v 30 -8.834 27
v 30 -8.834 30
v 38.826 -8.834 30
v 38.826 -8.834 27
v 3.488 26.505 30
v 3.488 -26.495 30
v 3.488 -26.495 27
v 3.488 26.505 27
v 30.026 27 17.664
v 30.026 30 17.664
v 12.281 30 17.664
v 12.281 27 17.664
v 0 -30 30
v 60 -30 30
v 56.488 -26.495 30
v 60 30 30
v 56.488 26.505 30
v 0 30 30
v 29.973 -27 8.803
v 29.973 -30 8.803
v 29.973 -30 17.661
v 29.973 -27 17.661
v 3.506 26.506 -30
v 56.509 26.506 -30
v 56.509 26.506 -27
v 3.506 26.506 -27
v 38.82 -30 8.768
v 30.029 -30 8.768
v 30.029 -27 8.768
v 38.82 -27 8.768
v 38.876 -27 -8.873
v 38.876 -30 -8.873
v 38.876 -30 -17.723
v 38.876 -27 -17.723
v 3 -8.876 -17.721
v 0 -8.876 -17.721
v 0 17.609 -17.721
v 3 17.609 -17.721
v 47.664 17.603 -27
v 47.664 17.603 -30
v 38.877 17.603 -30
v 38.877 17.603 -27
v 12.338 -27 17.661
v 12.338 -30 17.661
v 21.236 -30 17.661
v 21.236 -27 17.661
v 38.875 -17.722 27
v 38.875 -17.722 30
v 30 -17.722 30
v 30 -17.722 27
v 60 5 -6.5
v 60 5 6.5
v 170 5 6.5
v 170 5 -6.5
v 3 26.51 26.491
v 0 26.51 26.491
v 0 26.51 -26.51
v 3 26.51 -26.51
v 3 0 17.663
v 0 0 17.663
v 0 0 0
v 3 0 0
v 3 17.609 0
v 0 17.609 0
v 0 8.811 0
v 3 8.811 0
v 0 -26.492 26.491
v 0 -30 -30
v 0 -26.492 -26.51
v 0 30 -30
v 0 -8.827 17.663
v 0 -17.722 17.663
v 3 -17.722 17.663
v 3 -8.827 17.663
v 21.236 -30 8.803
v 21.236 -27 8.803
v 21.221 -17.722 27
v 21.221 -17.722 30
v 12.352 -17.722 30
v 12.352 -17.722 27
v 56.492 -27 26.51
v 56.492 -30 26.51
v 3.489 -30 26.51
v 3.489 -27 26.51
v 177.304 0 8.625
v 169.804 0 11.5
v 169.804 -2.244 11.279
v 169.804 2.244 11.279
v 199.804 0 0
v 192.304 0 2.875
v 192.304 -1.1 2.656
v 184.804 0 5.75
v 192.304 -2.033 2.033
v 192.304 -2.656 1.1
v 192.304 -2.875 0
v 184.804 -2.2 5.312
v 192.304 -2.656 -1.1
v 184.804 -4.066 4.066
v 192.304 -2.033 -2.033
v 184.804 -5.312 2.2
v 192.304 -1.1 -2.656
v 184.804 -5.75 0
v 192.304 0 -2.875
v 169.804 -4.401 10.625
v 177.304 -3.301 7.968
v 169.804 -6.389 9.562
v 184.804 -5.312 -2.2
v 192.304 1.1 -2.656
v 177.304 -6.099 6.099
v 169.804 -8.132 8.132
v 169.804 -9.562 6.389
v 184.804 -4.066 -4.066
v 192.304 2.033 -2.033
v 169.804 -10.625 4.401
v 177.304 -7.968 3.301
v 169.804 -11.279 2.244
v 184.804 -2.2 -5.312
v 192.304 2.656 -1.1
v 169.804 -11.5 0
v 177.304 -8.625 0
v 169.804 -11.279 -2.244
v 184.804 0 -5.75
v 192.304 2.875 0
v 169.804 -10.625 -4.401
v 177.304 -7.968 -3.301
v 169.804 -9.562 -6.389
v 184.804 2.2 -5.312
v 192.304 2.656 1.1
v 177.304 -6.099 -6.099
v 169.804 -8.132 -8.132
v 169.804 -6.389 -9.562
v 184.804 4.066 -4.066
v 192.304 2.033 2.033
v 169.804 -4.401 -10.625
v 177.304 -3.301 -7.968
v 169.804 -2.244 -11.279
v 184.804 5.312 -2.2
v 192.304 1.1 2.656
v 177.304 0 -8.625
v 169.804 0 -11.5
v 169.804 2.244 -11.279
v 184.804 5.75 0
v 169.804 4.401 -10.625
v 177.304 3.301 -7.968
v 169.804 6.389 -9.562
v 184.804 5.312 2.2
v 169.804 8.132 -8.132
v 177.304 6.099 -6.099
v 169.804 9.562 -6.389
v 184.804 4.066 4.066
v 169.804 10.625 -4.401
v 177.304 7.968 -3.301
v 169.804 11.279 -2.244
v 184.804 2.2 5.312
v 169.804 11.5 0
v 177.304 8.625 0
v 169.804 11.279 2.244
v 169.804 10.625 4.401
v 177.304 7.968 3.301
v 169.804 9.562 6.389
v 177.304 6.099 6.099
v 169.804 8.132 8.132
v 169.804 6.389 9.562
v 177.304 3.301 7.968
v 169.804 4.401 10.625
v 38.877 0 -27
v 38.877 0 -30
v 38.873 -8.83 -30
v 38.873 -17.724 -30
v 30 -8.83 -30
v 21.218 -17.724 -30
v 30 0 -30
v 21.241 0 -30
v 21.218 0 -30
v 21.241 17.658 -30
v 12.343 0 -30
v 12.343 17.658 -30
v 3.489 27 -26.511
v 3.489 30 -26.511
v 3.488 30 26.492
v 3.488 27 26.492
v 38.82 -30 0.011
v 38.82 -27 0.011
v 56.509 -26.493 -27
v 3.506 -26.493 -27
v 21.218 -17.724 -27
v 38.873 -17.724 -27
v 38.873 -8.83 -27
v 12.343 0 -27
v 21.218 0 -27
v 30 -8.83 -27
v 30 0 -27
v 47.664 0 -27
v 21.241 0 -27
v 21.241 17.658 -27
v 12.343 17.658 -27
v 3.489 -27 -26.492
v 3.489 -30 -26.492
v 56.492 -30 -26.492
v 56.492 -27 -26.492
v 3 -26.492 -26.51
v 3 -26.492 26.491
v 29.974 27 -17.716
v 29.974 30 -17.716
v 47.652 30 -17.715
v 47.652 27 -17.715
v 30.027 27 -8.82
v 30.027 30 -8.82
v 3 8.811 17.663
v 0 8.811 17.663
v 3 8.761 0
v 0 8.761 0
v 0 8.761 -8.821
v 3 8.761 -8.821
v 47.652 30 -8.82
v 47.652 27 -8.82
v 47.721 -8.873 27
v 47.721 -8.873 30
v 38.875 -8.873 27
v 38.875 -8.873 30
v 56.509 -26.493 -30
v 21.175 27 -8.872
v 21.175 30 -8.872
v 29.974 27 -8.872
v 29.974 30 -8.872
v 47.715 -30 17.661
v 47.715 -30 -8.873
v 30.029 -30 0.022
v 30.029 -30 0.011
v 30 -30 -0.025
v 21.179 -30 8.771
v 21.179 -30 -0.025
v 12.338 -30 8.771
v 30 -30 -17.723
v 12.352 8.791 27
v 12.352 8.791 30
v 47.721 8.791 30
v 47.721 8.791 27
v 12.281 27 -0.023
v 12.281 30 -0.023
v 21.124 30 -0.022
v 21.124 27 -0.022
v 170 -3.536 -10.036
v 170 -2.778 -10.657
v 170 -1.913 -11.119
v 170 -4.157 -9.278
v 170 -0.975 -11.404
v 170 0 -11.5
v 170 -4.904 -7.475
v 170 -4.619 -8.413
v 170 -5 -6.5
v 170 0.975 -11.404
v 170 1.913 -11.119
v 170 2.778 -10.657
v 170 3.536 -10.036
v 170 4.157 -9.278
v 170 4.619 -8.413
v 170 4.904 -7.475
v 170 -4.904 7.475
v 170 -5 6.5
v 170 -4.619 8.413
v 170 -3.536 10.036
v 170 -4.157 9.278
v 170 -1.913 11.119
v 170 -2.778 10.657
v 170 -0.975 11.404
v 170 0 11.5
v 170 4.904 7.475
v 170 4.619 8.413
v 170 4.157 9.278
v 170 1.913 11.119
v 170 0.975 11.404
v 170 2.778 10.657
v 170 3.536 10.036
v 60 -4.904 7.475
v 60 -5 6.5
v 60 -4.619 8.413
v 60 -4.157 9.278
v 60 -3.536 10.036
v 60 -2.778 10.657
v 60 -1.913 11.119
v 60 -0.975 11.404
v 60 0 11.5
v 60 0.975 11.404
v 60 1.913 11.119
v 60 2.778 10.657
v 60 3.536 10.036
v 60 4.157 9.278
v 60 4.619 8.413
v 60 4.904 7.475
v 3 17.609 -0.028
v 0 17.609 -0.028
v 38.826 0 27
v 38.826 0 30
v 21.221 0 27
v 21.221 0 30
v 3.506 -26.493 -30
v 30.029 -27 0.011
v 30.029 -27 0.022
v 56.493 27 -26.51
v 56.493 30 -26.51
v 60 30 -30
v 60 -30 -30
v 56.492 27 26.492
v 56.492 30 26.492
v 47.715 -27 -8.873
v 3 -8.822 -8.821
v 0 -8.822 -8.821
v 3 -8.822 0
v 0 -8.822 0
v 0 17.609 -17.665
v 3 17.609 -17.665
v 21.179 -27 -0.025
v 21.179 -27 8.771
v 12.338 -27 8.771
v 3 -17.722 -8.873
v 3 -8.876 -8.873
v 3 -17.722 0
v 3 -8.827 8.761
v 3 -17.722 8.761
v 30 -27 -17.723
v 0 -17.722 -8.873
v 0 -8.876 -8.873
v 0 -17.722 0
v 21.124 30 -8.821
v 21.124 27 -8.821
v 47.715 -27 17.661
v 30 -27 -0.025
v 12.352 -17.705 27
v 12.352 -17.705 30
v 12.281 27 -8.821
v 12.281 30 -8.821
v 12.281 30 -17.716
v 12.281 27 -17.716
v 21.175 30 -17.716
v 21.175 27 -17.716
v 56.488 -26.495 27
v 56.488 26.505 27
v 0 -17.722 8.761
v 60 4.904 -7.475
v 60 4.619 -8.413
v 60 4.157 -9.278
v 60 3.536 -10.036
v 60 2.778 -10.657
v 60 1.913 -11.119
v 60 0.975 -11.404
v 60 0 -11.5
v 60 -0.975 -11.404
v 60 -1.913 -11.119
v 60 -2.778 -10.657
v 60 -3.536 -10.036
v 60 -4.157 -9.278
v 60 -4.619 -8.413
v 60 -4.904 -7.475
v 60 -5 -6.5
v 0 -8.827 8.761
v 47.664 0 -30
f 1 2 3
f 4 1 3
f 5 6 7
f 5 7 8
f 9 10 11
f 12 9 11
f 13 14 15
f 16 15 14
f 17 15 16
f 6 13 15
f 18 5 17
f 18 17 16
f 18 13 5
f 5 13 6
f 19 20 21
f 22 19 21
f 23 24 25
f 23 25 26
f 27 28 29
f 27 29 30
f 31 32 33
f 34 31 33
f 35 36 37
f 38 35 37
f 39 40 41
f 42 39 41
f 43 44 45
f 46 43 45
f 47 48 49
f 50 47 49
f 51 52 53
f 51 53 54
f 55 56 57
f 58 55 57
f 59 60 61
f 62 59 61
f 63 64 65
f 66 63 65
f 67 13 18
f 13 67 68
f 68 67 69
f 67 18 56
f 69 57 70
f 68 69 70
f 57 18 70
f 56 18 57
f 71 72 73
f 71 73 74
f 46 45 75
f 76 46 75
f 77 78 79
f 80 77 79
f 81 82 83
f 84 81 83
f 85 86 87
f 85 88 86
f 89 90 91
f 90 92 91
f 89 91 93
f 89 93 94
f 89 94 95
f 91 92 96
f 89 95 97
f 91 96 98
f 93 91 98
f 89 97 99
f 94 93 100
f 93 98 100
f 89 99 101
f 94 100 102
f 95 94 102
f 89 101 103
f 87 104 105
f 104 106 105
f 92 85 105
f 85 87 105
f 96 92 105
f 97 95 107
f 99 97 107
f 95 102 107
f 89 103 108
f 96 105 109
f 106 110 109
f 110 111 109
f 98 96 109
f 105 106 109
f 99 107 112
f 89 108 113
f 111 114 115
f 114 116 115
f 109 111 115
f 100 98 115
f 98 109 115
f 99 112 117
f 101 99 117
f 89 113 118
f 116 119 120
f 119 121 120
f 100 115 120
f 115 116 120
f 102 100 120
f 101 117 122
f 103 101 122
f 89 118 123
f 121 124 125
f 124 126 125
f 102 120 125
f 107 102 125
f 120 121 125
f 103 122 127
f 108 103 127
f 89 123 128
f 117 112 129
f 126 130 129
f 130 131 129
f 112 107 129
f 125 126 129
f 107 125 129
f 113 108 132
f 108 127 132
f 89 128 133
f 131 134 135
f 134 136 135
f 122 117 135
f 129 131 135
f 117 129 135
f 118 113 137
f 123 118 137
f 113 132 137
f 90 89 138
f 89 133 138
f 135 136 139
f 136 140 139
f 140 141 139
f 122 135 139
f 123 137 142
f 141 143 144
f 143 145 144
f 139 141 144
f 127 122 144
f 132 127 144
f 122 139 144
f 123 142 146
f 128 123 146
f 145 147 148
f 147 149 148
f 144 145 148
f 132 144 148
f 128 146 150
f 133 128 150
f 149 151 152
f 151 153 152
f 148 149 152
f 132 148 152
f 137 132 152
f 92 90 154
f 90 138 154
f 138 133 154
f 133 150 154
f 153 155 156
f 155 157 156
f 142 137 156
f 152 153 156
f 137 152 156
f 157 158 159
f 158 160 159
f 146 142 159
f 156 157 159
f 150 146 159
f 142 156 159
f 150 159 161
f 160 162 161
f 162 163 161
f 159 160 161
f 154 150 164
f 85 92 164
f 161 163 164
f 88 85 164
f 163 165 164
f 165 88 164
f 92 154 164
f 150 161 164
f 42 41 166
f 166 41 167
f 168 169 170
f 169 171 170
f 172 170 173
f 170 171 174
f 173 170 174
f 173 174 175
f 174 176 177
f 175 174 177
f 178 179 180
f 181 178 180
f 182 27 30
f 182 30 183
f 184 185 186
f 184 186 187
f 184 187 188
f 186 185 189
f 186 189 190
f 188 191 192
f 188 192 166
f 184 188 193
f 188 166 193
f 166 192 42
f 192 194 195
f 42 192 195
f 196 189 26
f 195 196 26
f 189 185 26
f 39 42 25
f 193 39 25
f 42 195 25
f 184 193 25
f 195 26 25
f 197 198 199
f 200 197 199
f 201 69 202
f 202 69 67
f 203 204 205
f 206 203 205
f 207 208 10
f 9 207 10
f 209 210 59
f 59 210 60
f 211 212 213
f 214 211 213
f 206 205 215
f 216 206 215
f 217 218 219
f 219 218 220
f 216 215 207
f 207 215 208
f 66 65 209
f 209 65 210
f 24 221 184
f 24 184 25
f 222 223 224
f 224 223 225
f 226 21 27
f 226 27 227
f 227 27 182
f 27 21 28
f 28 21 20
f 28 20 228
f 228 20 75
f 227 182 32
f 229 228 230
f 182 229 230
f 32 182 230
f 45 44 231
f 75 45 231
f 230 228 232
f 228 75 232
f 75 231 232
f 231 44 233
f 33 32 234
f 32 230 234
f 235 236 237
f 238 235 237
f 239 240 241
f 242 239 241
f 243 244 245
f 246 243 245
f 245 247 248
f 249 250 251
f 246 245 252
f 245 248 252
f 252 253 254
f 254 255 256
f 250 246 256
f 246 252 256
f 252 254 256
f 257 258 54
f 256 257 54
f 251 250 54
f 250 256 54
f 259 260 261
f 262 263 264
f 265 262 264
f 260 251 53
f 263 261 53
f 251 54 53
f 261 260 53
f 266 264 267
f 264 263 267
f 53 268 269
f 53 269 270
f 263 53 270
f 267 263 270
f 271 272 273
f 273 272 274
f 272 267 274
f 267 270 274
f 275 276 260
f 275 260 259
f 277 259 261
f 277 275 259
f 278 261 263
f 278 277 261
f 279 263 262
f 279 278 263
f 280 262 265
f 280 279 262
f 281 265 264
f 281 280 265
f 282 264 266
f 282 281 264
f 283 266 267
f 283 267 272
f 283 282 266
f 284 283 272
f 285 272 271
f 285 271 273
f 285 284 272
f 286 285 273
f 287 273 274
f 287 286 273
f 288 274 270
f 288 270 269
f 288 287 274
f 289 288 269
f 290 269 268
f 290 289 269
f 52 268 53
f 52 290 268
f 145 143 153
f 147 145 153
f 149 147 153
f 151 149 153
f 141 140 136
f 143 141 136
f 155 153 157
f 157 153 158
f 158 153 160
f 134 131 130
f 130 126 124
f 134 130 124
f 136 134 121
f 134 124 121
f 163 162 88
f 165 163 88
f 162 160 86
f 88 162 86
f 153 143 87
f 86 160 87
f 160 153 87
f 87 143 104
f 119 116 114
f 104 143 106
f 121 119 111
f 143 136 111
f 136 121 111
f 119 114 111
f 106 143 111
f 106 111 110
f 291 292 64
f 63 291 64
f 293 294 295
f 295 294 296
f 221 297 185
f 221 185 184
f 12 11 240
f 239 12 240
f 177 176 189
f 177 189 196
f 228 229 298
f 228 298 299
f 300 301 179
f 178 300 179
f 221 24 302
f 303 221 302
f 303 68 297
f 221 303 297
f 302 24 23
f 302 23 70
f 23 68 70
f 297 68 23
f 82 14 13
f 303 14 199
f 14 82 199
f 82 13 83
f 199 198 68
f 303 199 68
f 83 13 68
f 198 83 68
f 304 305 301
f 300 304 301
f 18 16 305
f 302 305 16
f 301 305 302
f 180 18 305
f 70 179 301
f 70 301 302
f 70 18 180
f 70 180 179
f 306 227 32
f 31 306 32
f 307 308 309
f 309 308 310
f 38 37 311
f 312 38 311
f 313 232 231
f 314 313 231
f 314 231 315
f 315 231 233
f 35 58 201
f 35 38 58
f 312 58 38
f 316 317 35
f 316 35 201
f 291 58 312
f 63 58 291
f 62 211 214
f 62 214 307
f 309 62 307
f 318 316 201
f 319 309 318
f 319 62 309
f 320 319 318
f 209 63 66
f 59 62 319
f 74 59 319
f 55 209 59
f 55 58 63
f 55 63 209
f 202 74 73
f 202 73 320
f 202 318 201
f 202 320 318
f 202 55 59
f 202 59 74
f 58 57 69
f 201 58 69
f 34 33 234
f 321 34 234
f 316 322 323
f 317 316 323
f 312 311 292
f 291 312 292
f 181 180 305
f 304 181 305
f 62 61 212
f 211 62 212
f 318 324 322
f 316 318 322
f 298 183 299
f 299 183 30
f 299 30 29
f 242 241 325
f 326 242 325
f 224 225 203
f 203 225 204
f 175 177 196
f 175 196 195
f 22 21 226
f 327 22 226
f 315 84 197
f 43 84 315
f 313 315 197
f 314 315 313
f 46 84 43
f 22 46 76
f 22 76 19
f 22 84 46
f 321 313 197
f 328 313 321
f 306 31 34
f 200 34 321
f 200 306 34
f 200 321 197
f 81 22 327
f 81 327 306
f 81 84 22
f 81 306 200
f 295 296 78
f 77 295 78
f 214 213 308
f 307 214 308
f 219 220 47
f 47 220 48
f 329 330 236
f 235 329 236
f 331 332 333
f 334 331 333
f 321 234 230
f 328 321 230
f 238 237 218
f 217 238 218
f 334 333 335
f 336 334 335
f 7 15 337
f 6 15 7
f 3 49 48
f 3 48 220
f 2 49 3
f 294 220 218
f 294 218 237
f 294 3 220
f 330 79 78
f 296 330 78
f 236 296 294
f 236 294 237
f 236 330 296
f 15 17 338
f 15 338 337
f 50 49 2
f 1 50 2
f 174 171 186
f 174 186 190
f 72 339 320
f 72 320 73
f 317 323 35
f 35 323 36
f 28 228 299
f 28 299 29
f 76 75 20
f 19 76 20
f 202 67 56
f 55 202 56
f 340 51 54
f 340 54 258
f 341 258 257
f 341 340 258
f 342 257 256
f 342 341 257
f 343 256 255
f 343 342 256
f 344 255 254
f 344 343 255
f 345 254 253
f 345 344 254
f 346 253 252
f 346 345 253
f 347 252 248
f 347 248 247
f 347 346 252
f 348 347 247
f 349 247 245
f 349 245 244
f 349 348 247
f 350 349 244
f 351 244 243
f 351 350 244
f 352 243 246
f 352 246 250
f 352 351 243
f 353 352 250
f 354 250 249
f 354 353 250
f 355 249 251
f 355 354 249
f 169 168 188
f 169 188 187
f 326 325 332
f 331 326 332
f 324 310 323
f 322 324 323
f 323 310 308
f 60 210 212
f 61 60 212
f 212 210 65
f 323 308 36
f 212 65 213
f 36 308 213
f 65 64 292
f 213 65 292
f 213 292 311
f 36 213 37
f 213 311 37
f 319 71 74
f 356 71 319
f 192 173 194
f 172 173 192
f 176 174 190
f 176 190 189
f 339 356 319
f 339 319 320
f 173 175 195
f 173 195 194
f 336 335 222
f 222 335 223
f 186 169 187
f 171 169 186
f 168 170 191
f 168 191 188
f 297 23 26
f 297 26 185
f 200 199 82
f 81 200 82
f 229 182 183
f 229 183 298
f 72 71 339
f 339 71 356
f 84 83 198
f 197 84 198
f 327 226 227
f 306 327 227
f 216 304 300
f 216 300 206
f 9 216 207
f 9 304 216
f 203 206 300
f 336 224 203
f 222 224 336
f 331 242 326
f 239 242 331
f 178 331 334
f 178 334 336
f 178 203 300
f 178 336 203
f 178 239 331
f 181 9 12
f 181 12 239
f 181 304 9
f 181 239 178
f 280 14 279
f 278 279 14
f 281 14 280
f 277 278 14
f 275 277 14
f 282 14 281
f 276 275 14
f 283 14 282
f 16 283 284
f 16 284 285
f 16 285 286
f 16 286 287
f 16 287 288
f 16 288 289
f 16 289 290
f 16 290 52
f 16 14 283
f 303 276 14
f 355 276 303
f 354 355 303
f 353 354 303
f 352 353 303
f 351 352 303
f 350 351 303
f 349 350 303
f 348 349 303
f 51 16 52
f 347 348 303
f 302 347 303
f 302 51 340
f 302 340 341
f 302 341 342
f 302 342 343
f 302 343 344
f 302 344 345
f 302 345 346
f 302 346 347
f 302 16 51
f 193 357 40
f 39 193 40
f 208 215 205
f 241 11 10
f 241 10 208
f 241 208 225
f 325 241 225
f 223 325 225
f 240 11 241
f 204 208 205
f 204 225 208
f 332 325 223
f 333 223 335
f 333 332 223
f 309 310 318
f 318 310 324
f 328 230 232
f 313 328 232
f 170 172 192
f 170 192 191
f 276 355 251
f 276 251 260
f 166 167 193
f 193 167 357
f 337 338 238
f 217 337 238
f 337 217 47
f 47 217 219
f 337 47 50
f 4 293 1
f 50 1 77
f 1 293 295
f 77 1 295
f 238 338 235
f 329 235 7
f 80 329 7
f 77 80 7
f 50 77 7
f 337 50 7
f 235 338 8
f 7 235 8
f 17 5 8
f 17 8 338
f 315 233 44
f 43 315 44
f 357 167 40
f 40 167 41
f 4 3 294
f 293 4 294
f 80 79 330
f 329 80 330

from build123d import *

# Parameters (mm, degrees)
ESTRUSIONE_ESTRUSIONE1_DEPTH = 170
SCHIZZO5_W                   = 60
SCHIZZO5_H                   = 60
ESTRUSIONE_ESTRUSIONE2_DEPTH = 60
TAGLIO_ESTRUSIONE10_DEPTH    = 3
TAGLIO_ESTRUSIONE11_DEPTH    = 3
TAGLIO_ESTRUSIONE13_DEPTH    = 3
TAGLIO_ESTRUSIONE14_DEPTH    = 3
TAGLIO_ESTRUSIONE15_DEPTH    = 3


with BuildPart() as part:
    # Schizzo3 → Estrusione-Estrusione1 (new body)
    with BuildSketch(Plane(origin=(0, 0, 0), x_dir=(0, 0, -1), z_dir=(1, 0, 0))):
        with BuildLine():
            Line((-6.5, 5), (6.5, 5))
            ThreePointArc((6.5, 5), (11.5, 0), (6.5, -5))
            Line((6.5, -5), (-6.5, -5))
            ThreePointArc((-6.5, -5), (-11.5, 0), (-6.5, 5))
        make_face()
    extrude(amount=ESTRUSIONE_ESTRUSIONE1_DEPTH)

    # Schizzo5 → Estrusione-Estrusione2 (add)
    with BuildSketch(Plane(origin=(0, 0, 0), x_dir=(0, 0, -1), z_dir=(1, 0, 0))):
        Rectangle(SCHIZZO5_W, SCHIZZO5_H)
    extrude(amount=ESTRUSIONE_ESTRUSIONE2_DEPTH)

    # Schizzo3D7 → Taglio-Estrusione10 (cut)
    with BuildSketch(Plane(origin=(56.509252896, 26.505952129, -30), x_dir=(-0.7071372191638572, -0.7070763418989545, 0), z_dir=(0, 0, -1))):
        Polygon((0, 0), (37.480879661, 37.477652941), (74.95530616, 0), (37.4744265, -37.477652941), align=None)
        Polygon((12.549447187, -0.041107367), (18.763393239, 6.172303729), (31.2103731, -6.275747782), (24.996427048, -12.489158877), align=None, mode=Mode.SUBTRACT)
        Polygon((43.745393177, -18.806291324), (56.229474498, -6.323284754), (43.697232303, 6.210036431), (49.973132388, 12.485396224), (37.487721799, 24.971881772), (31.196030757, 18.680732379), (43.681441346, 6.194246832), (37.487382187, 0.000720919), (43.730669214, -6.243103637), (37.456438009, -12.516794695), align=None, mode=Mode.SUBTRACT)
    extrude(amount=-TAGLIO_ESTRUSIONE10_DEPTH, mode=Mode.SUBTRACT)

    # Schizzo3D9 → Taglio-Estrusione11 (cut)
    with BuildSketch(Plane(origin=(3.48896397, 30, -26.510632889), x_dir=(0.7071079856740462, 0, 0.7071055766969973), z_dir=(0, -1, 0))):
        Polygon((0, 0), (37.477803778, 37.478791667), (74.95758336, 0), (37.479779582, -37.478791667), align=None)
        Polygon((12.43579878, 0.00203054), (18.724902507, -6.286907414), (24.978062752, -0.033582341), (31.199748191, -6.255103785), (24.946587946, -12.508428859), (37.447554582, -25.009065987), (43.737305453, -18.719149323), (31.273888011, -6.256060399), (50.001148896, 12.471694123), (37.452810535, 25.019701726), (24.946652169, 12.513213707), (31.199675089, 6.260355607), (24.978572571, 0.039089105), (18.72554965, 6.291947204), align=None, mode=Mode.SUBTRACT)
    extrude(amount=TAGLIO_ESTRUSIONE11_DEPTH, mode=Mode.SUBTRACT)

    # Schizzo3D10 → Taglio-Estrusione13 (cut)
    # profile 1 of 2: a face of its own
    with BuildSketch(Plane(origin=(3.488655303, -30, 26.510146491), x_dir=(0.7071145512231992, 0, -0.7070990110645141), z_dir=(0, -1, 0))):
        Polygon((0, 0), (37.477604433, -37.478428091), (74.9568562, 0), (37.479251767, 37.478428091), align=None)
        Polygon((25.052273044, -0.034278035), (18.80084393, -6.285569762), (12.515044966, 0.000367348), (18.806420078, 6.291604196), (25.070142969, 0.027743646), (31.248306687, 6.205771587), (24.984583796, 12.469632138), (37.530042105, 25.014814736), (56.292018249, 6.252426254), (50.041865549, 0.002410912), (56.299922917, -6.255783991), (50.023820889, -12.531748091), (37.509650627, -0.0173028), (31.272337329, -6.254479021), align=None, mode=Mode.SUBTRACT)
    # profile 2 of 2: a face of its own
    with BuildSketch(Plane(origin=(3.488655303, -30, 26.510146491), x_dir=(0.7071145512231992, 0, -0.7070990110645141), z_dir=(0, -1, 0))):
        Polygon((37.496799303, 0.036168583), (31.312223937, 6.22087987), (37.528934609, 12.437453919), (43.720930387, 6.245322057), (37.504355954, 0.028884245), align=None)
    extrude(amount=-TAGLIO_ESTRUSIONE13_DEPTH, mode=Mode.SUBTRACT)

    # Schizzo3D11 → Taglio-Estrusione14 (cut)
    with BuildSketch(Plane(origin=(3.48761134, -26.495070277, 30), x_dir=(0.7071106609809186, 0.7071029013708885, 0), z_dir=(0, 0, 1))):
        Polygon((0, 0), (37.47640364, 37.476814899), (74.953629802, 0), (37.477226162, -37.476814899), align=None)
        Polygon((12.483616576, -0.053090758), (31.219303961, 18.682802228), (56.228931149, -6.326550512), (43.738644318, -18.816974409), (37.483135519, -12.561534256), (31.226265699, -18.818472739), (24.950948382, -12.543224286), (31.235576896, -6.258526806), (37.476342879, -12.499224305), (43.722678491, -6.252820147), (31.274462582, 6.195259158), (18.743498457, -6.335842479), (12.472147309, -0.064560151), align=None, mode=Mode.SUBTRACT)
    extrude(amount=-TAGLIO_ESTRUSIONE14_DEPTH, mode=Mode.SUBTRACT)

    # Schizzo3D12 → Taglio-Estrusione15 (cut)
    with BuildSketch(Plane(origin=(0, 26.510328561, -26.510258091), x_dir=(0, -0.7071155777670133, 0.707097984496649), z_dir=(-1, 0, 0))):
        Polygon((0, 0), (37.478907887, -37.477975399), (74.955950822, 0), (37.477042935, 37.477975399), align=None)
        Polygon((12.548610555, -0.039984823), (25.020040578, 12.431755501), (25.039803863, 12.451519277), (31.26096878, 6.230509145), (43.750153238, 18.720004346), (49.98040082, 12.489911774), (37.491216362, 0.000416573), (31.296299436, 6.195179367), (25.059044147, -0.04223111), (37.492371823, -12.475249441), (43.729627112, -6.237838964), (50.02267626, -12.530731538), (43.748911666, -18.804652229), (37.493935145, -12.549831334), (31.237084407, -18.806837749), (12.509188531, -0.079407829), align=None, mode=Mode.SUBTRACT)
        Polygon((49.927796206, -0.045447197), (56.217879582, -6.335374073), (62.511860718, -0.041236337), (56.221777342, 6.248690539), align=None, mode=Mode.SUBTRACT)
    extrude(amount=-TAGLIO_ESTRUSIONE15_DEPTH, mode=Mode.SUBTRACT)


with BuildPart() as body_2:
    # Schizzo8 → Rivoluzione1 (revolve)
    with BuildSketch(Plane(origin=(-2.00656725, 0, 0), x_dir=(1, 0, 0), z_dir=(0, 1, 0))):
        Polygon((171.810987293, 0), (201.810987293, 0), (171.810987293, -11.5), align=None)
    revolve(axis=Axis((169.804420043, 0, 0), (1, 0, 0)))


solid = Compound([part.part, body_2.part])
